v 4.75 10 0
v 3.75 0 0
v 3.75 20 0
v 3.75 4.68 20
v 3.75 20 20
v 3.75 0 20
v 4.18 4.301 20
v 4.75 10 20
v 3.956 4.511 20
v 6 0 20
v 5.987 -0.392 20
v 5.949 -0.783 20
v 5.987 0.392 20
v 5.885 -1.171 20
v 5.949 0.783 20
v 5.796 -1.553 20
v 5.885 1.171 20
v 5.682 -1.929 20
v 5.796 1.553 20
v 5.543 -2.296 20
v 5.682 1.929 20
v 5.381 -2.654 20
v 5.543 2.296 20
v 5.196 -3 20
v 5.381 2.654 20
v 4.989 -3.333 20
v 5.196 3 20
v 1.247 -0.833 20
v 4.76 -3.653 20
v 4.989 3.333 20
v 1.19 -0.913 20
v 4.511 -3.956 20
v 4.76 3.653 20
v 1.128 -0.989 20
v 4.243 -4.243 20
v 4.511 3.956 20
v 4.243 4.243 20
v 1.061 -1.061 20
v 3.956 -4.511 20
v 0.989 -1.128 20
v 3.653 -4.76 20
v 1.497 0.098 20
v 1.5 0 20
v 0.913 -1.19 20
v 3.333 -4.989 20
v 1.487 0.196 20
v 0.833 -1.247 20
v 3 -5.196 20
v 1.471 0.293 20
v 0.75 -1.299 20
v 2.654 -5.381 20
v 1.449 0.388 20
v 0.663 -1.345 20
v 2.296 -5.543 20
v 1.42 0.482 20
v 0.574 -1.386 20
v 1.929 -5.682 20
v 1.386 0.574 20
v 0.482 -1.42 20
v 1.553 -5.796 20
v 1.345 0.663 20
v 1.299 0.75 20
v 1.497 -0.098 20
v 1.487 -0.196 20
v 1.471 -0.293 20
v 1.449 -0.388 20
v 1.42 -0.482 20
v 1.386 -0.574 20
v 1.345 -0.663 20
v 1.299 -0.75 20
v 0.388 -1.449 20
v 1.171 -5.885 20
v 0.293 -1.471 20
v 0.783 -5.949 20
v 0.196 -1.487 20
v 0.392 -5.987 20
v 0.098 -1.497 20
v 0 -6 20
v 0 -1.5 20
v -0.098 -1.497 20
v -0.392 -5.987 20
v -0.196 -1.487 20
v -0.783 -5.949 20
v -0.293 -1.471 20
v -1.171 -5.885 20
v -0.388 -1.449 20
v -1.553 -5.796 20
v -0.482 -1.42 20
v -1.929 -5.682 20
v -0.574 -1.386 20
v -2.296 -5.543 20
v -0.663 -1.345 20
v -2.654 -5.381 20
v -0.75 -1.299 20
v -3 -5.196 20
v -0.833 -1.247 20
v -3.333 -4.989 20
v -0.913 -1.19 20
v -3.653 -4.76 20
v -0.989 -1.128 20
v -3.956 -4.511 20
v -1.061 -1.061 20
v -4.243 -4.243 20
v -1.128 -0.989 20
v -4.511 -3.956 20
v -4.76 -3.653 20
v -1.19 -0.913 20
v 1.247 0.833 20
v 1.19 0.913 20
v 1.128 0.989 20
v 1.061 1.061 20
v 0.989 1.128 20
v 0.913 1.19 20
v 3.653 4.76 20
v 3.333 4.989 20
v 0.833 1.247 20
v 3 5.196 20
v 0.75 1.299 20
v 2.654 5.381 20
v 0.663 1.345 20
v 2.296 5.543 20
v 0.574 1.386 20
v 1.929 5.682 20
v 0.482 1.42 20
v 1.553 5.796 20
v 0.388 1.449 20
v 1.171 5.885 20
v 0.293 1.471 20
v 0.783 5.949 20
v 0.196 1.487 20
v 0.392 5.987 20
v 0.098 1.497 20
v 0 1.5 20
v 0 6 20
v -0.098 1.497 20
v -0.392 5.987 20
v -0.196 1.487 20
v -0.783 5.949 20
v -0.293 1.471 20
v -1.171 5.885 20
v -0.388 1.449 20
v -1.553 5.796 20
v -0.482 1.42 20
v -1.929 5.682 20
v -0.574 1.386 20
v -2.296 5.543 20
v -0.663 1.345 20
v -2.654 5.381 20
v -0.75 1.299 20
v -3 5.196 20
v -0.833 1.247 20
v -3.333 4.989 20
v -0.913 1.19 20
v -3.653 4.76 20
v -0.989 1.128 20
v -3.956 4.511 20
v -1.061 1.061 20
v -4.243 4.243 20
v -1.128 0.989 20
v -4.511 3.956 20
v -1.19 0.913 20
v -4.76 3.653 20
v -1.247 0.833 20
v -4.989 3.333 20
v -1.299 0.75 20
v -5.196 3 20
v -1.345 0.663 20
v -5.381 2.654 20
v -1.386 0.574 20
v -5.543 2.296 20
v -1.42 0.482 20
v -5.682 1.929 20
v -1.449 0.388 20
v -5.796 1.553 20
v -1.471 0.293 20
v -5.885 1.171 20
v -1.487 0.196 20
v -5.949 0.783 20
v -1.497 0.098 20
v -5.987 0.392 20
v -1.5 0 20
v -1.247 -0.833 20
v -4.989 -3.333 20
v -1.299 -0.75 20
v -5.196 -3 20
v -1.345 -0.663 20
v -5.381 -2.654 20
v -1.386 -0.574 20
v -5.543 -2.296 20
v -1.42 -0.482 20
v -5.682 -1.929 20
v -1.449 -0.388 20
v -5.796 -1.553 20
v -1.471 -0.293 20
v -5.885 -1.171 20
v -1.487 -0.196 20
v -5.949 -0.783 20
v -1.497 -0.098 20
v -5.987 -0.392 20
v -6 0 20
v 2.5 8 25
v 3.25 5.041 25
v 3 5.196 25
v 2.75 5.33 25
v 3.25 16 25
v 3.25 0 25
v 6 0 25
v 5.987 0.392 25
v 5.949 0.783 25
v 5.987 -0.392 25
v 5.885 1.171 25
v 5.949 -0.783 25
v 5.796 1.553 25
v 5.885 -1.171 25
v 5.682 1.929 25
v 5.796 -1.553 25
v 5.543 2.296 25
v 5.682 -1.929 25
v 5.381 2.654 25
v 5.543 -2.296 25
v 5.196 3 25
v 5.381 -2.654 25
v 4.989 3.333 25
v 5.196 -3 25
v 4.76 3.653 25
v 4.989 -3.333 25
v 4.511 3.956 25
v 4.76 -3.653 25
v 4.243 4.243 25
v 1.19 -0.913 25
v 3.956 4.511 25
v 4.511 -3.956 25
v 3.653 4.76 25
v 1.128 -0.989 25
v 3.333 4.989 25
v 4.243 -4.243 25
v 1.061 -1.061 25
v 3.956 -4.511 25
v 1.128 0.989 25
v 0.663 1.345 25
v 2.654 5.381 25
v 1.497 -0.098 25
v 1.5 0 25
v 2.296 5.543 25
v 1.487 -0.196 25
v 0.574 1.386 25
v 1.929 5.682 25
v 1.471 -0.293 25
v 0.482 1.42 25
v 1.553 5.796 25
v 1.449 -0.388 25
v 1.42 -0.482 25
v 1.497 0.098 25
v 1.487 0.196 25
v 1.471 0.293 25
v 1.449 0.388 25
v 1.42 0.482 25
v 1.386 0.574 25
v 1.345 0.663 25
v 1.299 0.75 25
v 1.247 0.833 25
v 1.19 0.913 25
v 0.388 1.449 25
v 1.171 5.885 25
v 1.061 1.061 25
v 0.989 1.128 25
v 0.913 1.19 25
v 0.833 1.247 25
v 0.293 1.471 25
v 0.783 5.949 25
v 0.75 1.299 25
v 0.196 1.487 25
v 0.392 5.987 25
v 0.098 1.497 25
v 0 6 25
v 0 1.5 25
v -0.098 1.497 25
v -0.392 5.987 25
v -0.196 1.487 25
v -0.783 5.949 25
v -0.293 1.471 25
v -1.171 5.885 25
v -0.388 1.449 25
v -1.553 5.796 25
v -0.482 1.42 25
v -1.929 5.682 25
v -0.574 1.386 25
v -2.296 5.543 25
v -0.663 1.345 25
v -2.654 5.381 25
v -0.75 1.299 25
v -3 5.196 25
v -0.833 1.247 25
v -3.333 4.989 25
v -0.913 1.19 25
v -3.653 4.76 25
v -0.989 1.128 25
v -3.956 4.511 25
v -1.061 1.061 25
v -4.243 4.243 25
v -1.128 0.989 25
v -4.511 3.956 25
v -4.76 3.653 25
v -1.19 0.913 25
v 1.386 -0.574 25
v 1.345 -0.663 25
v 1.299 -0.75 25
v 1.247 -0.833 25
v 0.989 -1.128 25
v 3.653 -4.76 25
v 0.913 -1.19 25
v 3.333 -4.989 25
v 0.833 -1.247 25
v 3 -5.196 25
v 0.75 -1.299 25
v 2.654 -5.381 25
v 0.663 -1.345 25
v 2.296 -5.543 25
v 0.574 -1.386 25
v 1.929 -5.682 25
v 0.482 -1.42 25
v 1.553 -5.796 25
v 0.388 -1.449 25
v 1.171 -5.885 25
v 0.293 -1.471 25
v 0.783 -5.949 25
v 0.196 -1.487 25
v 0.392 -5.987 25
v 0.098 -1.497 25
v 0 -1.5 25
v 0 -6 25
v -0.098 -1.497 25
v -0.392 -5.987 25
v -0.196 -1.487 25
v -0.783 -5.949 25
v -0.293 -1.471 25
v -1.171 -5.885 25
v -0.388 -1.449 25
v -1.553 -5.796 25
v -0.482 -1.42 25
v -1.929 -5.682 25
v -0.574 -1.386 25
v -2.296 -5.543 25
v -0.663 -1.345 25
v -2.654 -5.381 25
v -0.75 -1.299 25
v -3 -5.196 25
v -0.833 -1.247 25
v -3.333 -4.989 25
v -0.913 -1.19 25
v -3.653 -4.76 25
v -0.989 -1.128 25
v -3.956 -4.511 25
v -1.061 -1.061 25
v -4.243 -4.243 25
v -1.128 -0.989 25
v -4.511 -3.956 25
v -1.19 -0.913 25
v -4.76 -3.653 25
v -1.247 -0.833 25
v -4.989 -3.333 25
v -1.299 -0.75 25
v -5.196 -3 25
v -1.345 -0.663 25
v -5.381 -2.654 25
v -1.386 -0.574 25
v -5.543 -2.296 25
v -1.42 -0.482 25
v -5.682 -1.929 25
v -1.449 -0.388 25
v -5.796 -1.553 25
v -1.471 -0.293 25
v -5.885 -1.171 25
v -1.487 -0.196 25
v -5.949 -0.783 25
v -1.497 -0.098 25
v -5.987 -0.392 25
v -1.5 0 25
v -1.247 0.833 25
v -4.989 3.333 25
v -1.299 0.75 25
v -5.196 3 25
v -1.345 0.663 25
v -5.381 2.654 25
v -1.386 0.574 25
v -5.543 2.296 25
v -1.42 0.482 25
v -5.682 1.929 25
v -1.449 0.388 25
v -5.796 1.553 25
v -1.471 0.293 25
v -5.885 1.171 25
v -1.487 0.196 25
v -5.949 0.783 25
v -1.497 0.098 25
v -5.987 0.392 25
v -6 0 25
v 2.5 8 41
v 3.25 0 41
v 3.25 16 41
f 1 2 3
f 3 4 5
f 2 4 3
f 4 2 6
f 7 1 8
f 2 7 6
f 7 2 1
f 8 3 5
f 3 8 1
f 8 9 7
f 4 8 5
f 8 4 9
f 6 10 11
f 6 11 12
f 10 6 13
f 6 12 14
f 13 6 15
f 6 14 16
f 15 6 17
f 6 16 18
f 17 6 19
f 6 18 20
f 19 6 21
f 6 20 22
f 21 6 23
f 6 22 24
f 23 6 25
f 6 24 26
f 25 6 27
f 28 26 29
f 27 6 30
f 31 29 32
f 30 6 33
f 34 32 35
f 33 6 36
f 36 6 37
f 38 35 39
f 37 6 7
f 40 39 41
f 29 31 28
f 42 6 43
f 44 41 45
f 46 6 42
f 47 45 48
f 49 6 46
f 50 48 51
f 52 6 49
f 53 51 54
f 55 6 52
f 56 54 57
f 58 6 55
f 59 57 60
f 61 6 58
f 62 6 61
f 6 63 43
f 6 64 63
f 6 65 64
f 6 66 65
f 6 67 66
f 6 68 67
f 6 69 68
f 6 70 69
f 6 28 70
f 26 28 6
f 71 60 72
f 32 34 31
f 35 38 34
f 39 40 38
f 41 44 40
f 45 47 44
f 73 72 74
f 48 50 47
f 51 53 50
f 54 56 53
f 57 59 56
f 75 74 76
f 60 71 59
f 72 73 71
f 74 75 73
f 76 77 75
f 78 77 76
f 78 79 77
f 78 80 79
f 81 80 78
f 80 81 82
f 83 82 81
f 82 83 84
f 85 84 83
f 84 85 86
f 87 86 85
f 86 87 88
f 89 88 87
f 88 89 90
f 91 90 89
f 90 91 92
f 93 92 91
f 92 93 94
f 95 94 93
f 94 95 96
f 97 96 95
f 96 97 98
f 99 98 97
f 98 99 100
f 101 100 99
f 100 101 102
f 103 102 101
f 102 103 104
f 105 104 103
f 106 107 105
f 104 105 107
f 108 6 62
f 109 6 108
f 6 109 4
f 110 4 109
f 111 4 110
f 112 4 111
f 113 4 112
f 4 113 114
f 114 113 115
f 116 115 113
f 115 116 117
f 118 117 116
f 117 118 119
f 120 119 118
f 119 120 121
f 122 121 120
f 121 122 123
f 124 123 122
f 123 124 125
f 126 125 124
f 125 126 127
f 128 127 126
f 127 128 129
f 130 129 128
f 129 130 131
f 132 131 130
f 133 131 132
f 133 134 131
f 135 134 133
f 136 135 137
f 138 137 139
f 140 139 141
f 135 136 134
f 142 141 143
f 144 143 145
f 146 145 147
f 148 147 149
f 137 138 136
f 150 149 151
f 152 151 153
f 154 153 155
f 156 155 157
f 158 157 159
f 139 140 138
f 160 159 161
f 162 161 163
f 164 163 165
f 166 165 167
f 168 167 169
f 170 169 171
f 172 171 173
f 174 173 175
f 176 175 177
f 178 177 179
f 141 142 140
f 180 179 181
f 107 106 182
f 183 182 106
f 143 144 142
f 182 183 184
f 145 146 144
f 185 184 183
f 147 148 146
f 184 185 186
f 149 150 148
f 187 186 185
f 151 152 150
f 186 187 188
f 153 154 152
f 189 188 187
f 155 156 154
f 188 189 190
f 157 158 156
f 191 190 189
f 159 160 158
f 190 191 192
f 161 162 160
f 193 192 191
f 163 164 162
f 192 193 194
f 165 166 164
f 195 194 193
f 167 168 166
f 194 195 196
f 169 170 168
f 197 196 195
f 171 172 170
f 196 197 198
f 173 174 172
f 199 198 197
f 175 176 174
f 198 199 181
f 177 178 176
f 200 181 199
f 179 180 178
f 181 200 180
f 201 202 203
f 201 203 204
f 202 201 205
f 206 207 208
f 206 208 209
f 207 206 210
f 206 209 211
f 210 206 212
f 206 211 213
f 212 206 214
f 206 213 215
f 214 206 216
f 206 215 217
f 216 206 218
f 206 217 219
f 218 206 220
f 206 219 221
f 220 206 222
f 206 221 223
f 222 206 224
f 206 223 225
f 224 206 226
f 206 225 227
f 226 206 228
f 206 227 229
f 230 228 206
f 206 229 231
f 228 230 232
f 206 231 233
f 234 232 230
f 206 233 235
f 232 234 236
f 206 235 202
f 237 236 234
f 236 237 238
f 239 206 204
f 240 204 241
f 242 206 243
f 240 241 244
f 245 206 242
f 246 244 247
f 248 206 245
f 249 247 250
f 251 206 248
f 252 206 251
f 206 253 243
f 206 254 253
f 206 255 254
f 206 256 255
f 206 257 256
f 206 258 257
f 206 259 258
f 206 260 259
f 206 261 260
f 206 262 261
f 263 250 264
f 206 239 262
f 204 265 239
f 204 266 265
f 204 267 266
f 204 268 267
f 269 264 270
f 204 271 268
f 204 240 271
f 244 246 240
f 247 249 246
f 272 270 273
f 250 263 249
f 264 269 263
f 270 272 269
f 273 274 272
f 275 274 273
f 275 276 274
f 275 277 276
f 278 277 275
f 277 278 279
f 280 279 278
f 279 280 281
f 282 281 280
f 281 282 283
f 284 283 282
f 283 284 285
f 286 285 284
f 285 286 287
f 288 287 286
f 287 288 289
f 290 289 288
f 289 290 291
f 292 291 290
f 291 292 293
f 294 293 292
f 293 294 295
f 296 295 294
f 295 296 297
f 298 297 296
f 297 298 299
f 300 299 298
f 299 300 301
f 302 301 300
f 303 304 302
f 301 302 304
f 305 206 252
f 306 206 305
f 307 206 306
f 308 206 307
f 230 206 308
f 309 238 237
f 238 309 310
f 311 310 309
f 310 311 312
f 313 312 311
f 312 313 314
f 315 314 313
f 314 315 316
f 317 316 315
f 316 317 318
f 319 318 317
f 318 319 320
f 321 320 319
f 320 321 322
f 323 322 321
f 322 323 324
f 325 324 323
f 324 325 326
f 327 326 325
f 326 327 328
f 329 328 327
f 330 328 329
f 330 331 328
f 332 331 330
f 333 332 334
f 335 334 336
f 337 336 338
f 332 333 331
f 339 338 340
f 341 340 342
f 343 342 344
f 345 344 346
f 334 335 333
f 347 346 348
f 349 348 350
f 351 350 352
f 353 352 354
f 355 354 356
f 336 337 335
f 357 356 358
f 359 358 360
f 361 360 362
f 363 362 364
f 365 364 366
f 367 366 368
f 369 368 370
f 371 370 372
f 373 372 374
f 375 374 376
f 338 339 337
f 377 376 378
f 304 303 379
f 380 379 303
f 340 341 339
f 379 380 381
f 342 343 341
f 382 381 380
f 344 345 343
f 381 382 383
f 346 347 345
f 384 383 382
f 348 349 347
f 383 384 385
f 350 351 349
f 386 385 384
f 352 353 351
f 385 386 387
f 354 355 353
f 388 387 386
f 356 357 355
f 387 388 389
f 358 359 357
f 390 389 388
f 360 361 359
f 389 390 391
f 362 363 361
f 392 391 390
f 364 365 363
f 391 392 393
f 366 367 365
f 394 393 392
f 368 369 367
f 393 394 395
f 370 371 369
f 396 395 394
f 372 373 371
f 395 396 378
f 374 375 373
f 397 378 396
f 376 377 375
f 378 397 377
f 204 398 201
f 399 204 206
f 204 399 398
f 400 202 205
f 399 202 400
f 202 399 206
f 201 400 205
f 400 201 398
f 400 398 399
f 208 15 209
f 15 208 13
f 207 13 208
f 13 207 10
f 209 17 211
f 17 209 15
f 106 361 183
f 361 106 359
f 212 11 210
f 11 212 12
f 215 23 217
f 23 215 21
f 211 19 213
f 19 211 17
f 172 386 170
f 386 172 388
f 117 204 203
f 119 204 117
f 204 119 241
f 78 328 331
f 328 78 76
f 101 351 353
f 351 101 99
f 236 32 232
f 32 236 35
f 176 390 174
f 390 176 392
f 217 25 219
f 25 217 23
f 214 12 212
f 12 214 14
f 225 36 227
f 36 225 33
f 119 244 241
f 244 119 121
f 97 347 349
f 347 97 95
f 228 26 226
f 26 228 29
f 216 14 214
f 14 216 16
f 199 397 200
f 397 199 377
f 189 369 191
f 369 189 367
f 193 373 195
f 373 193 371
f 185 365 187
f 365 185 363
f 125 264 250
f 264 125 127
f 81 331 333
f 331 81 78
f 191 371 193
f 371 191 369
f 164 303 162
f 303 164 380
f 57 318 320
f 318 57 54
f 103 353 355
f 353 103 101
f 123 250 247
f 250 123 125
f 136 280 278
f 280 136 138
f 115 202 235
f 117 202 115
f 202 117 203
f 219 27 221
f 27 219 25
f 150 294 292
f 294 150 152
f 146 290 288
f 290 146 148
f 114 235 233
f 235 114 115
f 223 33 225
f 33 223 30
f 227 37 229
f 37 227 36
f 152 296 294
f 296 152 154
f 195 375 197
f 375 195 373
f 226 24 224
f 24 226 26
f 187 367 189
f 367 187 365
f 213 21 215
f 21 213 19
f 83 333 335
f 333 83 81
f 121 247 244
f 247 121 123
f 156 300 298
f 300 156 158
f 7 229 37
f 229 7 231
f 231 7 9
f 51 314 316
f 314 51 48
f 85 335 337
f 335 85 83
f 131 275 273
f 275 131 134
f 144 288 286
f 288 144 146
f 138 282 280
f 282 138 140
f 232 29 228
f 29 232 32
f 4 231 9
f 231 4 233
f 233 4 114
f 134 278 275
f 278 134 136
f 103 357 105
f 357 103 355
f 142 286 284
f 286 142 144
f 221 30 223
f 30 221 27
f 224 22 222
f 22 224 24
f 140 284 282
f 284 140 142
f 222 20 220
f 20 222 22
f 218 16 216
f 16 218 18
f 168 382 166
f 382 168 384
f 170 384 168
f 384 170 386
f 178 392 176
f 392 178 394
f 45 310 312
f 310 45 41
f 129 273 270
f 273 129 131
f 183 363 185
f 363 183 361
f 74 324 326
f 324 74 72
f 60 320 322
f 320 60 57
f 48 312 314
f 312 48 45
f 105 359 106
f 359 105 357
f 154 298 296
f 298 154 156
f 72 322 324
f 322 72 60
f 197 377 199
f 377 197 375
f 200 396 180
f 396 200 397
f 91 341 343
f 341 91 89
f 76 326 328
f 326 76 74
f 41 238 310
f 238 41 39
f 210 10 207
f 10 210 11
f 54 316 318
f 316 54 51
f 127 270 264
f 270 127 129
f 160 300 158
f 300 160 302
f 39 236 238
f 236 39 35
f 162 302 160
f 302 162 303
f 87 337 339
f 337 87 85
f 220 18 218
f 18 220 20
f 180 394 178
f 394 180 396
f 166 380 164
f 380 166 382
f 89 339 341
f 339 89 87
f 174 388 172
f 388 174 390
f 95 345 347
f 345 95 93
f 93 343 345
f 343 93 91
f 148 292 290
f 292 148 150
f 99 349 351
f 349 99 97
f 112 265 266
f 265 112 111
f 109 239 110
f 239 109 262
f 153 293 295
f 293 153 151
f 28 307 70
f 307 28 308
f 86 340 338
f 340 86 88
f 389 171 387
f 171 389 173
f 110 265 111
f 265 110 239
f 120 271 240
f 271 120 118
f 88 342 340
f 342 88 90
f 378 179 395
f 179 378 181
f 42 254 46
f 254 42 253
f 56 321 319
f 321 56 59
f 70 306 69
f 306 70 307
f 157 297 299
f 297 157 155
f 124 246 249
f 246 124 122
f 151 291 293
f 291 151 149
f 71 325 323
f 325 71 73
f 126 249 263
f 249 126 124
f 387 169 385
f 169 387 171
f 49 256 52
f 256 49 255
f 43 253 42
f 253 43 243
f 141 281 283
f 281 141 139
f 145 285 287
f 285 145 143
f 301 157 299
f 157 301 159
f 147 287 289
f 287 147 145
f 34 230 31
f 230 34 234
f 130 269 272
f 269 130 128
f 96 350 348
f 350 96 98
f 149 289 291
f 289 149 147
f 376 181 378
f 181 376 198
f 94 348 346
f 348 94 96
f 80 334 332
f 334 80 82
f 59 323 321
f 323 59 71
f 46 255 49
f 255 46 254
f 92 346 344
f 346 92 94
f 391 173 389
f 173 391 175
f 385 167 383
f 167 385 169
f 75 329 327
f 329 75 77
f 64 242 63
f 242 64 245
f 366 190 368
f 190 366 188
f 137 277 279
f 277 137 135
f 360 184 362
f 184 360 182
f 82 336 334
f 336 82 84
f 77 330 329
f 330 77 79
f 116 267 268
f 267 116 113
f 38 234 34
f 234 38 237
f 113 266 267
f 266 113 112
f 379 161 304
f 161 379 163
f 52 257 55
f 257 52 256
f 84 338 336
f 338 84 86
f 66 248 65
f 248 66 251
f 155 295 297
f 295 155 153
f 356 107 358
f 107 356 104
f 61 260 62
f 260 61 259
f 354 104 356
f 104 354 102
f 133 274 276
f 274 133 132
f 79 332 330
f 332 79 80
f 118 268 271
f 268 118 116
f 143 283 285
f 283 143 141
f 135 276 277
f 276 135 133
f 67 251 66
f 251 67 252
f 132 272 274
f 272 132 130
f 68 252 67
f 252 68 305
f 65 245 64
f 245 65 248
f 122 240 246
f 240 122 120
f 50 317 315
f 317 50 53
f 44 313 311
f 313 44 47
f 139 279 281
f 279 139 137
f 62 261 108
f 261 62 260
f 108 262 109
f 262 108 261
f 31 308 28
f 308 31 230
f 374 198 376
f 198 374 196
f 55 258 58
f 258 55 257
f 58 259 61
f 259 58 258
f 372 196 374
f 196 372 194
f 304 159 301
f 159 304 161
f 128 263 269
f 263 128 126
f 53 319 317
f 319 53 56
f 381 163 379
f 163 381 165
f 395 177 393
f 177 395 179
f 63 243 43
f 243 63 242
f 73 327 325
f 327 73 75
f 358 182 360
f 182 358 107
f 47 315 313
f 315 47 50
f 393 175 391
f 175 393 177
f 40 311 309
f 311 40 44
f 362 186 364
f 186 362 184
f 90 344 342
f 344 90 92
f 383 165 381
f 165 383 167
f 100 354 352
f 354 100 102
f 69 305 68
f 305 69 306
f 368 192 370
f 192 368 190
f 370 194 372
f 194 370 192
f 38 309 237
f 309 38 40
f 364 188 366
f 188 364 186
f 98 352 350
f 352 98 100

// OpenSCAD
// Hose-barb reducer: 8 mm ID -> 5 mm ID
// Print orientation: standing upright along Z

$fn = 96;

// ---- Dimensions (mm) ----
id_8      = 8;     // 8 mm tubing inner diameter
id_5      = 5;     // 5 mm tubing inner diameter
bore      = 3;     // through-bore diameter
barb_h_8  = 10;    // height of each 8 mm barb
od_8_bot  = 7.5;   // outer diameter of 8 mm barb at bottom
od_8_top  = 9.5;   // outer diameter of 8 mm barb at top
collar_d  = 12;    // diameter of cylindrical collar
barb_h_5  = 8;     // height of each 5 mm barb
od_5_bot  = 6.5;   // outer diameter of 5 mm barb at bottom
od_5_top  = 5.0;   // outer diameter of 5 mm barb at top
z_20      = 20;    // start of collar
z_25      = 25;    // end of collar
z_41      = 41;    // end of part

eps = 0.5;         // cutter overshoot

// ---- Model ----
difference() {
    union() {
        // 8 mm barbs (z = 0 to 20)
        for (s = [-1, 1])
            translate([0, 0, s > 0 ? 10 : 0])
                linear_extrude(height = 10)
                    polygon([
                        [od_8_bot / 2, 0],
                        [od_8_top / 2, 10],
                        [od_8_bot / 2, 20]
                    ]);
        // collar (z = 20 to 25)
        translate([0, 0, z_20])
            cylinder(d = collar_d, h = 5);
        // 5 mm barbs (z = 25 to 41)
        for (s = [-1, 1])
            translate([0, 0, s > 0 ? 33 : 25])
                linear_extrude(height = 8)
                    polygon([
                        [od_5_bot / 2, 0],
                        [od_5_top / 2, 8],
                        [od_5_bot / 2, 16]
                    ]);
    }
    // through-bore
    translate([0, 0, -eps])
        cylinder(d = bore, h = z_41 + 2 * eps);
}
